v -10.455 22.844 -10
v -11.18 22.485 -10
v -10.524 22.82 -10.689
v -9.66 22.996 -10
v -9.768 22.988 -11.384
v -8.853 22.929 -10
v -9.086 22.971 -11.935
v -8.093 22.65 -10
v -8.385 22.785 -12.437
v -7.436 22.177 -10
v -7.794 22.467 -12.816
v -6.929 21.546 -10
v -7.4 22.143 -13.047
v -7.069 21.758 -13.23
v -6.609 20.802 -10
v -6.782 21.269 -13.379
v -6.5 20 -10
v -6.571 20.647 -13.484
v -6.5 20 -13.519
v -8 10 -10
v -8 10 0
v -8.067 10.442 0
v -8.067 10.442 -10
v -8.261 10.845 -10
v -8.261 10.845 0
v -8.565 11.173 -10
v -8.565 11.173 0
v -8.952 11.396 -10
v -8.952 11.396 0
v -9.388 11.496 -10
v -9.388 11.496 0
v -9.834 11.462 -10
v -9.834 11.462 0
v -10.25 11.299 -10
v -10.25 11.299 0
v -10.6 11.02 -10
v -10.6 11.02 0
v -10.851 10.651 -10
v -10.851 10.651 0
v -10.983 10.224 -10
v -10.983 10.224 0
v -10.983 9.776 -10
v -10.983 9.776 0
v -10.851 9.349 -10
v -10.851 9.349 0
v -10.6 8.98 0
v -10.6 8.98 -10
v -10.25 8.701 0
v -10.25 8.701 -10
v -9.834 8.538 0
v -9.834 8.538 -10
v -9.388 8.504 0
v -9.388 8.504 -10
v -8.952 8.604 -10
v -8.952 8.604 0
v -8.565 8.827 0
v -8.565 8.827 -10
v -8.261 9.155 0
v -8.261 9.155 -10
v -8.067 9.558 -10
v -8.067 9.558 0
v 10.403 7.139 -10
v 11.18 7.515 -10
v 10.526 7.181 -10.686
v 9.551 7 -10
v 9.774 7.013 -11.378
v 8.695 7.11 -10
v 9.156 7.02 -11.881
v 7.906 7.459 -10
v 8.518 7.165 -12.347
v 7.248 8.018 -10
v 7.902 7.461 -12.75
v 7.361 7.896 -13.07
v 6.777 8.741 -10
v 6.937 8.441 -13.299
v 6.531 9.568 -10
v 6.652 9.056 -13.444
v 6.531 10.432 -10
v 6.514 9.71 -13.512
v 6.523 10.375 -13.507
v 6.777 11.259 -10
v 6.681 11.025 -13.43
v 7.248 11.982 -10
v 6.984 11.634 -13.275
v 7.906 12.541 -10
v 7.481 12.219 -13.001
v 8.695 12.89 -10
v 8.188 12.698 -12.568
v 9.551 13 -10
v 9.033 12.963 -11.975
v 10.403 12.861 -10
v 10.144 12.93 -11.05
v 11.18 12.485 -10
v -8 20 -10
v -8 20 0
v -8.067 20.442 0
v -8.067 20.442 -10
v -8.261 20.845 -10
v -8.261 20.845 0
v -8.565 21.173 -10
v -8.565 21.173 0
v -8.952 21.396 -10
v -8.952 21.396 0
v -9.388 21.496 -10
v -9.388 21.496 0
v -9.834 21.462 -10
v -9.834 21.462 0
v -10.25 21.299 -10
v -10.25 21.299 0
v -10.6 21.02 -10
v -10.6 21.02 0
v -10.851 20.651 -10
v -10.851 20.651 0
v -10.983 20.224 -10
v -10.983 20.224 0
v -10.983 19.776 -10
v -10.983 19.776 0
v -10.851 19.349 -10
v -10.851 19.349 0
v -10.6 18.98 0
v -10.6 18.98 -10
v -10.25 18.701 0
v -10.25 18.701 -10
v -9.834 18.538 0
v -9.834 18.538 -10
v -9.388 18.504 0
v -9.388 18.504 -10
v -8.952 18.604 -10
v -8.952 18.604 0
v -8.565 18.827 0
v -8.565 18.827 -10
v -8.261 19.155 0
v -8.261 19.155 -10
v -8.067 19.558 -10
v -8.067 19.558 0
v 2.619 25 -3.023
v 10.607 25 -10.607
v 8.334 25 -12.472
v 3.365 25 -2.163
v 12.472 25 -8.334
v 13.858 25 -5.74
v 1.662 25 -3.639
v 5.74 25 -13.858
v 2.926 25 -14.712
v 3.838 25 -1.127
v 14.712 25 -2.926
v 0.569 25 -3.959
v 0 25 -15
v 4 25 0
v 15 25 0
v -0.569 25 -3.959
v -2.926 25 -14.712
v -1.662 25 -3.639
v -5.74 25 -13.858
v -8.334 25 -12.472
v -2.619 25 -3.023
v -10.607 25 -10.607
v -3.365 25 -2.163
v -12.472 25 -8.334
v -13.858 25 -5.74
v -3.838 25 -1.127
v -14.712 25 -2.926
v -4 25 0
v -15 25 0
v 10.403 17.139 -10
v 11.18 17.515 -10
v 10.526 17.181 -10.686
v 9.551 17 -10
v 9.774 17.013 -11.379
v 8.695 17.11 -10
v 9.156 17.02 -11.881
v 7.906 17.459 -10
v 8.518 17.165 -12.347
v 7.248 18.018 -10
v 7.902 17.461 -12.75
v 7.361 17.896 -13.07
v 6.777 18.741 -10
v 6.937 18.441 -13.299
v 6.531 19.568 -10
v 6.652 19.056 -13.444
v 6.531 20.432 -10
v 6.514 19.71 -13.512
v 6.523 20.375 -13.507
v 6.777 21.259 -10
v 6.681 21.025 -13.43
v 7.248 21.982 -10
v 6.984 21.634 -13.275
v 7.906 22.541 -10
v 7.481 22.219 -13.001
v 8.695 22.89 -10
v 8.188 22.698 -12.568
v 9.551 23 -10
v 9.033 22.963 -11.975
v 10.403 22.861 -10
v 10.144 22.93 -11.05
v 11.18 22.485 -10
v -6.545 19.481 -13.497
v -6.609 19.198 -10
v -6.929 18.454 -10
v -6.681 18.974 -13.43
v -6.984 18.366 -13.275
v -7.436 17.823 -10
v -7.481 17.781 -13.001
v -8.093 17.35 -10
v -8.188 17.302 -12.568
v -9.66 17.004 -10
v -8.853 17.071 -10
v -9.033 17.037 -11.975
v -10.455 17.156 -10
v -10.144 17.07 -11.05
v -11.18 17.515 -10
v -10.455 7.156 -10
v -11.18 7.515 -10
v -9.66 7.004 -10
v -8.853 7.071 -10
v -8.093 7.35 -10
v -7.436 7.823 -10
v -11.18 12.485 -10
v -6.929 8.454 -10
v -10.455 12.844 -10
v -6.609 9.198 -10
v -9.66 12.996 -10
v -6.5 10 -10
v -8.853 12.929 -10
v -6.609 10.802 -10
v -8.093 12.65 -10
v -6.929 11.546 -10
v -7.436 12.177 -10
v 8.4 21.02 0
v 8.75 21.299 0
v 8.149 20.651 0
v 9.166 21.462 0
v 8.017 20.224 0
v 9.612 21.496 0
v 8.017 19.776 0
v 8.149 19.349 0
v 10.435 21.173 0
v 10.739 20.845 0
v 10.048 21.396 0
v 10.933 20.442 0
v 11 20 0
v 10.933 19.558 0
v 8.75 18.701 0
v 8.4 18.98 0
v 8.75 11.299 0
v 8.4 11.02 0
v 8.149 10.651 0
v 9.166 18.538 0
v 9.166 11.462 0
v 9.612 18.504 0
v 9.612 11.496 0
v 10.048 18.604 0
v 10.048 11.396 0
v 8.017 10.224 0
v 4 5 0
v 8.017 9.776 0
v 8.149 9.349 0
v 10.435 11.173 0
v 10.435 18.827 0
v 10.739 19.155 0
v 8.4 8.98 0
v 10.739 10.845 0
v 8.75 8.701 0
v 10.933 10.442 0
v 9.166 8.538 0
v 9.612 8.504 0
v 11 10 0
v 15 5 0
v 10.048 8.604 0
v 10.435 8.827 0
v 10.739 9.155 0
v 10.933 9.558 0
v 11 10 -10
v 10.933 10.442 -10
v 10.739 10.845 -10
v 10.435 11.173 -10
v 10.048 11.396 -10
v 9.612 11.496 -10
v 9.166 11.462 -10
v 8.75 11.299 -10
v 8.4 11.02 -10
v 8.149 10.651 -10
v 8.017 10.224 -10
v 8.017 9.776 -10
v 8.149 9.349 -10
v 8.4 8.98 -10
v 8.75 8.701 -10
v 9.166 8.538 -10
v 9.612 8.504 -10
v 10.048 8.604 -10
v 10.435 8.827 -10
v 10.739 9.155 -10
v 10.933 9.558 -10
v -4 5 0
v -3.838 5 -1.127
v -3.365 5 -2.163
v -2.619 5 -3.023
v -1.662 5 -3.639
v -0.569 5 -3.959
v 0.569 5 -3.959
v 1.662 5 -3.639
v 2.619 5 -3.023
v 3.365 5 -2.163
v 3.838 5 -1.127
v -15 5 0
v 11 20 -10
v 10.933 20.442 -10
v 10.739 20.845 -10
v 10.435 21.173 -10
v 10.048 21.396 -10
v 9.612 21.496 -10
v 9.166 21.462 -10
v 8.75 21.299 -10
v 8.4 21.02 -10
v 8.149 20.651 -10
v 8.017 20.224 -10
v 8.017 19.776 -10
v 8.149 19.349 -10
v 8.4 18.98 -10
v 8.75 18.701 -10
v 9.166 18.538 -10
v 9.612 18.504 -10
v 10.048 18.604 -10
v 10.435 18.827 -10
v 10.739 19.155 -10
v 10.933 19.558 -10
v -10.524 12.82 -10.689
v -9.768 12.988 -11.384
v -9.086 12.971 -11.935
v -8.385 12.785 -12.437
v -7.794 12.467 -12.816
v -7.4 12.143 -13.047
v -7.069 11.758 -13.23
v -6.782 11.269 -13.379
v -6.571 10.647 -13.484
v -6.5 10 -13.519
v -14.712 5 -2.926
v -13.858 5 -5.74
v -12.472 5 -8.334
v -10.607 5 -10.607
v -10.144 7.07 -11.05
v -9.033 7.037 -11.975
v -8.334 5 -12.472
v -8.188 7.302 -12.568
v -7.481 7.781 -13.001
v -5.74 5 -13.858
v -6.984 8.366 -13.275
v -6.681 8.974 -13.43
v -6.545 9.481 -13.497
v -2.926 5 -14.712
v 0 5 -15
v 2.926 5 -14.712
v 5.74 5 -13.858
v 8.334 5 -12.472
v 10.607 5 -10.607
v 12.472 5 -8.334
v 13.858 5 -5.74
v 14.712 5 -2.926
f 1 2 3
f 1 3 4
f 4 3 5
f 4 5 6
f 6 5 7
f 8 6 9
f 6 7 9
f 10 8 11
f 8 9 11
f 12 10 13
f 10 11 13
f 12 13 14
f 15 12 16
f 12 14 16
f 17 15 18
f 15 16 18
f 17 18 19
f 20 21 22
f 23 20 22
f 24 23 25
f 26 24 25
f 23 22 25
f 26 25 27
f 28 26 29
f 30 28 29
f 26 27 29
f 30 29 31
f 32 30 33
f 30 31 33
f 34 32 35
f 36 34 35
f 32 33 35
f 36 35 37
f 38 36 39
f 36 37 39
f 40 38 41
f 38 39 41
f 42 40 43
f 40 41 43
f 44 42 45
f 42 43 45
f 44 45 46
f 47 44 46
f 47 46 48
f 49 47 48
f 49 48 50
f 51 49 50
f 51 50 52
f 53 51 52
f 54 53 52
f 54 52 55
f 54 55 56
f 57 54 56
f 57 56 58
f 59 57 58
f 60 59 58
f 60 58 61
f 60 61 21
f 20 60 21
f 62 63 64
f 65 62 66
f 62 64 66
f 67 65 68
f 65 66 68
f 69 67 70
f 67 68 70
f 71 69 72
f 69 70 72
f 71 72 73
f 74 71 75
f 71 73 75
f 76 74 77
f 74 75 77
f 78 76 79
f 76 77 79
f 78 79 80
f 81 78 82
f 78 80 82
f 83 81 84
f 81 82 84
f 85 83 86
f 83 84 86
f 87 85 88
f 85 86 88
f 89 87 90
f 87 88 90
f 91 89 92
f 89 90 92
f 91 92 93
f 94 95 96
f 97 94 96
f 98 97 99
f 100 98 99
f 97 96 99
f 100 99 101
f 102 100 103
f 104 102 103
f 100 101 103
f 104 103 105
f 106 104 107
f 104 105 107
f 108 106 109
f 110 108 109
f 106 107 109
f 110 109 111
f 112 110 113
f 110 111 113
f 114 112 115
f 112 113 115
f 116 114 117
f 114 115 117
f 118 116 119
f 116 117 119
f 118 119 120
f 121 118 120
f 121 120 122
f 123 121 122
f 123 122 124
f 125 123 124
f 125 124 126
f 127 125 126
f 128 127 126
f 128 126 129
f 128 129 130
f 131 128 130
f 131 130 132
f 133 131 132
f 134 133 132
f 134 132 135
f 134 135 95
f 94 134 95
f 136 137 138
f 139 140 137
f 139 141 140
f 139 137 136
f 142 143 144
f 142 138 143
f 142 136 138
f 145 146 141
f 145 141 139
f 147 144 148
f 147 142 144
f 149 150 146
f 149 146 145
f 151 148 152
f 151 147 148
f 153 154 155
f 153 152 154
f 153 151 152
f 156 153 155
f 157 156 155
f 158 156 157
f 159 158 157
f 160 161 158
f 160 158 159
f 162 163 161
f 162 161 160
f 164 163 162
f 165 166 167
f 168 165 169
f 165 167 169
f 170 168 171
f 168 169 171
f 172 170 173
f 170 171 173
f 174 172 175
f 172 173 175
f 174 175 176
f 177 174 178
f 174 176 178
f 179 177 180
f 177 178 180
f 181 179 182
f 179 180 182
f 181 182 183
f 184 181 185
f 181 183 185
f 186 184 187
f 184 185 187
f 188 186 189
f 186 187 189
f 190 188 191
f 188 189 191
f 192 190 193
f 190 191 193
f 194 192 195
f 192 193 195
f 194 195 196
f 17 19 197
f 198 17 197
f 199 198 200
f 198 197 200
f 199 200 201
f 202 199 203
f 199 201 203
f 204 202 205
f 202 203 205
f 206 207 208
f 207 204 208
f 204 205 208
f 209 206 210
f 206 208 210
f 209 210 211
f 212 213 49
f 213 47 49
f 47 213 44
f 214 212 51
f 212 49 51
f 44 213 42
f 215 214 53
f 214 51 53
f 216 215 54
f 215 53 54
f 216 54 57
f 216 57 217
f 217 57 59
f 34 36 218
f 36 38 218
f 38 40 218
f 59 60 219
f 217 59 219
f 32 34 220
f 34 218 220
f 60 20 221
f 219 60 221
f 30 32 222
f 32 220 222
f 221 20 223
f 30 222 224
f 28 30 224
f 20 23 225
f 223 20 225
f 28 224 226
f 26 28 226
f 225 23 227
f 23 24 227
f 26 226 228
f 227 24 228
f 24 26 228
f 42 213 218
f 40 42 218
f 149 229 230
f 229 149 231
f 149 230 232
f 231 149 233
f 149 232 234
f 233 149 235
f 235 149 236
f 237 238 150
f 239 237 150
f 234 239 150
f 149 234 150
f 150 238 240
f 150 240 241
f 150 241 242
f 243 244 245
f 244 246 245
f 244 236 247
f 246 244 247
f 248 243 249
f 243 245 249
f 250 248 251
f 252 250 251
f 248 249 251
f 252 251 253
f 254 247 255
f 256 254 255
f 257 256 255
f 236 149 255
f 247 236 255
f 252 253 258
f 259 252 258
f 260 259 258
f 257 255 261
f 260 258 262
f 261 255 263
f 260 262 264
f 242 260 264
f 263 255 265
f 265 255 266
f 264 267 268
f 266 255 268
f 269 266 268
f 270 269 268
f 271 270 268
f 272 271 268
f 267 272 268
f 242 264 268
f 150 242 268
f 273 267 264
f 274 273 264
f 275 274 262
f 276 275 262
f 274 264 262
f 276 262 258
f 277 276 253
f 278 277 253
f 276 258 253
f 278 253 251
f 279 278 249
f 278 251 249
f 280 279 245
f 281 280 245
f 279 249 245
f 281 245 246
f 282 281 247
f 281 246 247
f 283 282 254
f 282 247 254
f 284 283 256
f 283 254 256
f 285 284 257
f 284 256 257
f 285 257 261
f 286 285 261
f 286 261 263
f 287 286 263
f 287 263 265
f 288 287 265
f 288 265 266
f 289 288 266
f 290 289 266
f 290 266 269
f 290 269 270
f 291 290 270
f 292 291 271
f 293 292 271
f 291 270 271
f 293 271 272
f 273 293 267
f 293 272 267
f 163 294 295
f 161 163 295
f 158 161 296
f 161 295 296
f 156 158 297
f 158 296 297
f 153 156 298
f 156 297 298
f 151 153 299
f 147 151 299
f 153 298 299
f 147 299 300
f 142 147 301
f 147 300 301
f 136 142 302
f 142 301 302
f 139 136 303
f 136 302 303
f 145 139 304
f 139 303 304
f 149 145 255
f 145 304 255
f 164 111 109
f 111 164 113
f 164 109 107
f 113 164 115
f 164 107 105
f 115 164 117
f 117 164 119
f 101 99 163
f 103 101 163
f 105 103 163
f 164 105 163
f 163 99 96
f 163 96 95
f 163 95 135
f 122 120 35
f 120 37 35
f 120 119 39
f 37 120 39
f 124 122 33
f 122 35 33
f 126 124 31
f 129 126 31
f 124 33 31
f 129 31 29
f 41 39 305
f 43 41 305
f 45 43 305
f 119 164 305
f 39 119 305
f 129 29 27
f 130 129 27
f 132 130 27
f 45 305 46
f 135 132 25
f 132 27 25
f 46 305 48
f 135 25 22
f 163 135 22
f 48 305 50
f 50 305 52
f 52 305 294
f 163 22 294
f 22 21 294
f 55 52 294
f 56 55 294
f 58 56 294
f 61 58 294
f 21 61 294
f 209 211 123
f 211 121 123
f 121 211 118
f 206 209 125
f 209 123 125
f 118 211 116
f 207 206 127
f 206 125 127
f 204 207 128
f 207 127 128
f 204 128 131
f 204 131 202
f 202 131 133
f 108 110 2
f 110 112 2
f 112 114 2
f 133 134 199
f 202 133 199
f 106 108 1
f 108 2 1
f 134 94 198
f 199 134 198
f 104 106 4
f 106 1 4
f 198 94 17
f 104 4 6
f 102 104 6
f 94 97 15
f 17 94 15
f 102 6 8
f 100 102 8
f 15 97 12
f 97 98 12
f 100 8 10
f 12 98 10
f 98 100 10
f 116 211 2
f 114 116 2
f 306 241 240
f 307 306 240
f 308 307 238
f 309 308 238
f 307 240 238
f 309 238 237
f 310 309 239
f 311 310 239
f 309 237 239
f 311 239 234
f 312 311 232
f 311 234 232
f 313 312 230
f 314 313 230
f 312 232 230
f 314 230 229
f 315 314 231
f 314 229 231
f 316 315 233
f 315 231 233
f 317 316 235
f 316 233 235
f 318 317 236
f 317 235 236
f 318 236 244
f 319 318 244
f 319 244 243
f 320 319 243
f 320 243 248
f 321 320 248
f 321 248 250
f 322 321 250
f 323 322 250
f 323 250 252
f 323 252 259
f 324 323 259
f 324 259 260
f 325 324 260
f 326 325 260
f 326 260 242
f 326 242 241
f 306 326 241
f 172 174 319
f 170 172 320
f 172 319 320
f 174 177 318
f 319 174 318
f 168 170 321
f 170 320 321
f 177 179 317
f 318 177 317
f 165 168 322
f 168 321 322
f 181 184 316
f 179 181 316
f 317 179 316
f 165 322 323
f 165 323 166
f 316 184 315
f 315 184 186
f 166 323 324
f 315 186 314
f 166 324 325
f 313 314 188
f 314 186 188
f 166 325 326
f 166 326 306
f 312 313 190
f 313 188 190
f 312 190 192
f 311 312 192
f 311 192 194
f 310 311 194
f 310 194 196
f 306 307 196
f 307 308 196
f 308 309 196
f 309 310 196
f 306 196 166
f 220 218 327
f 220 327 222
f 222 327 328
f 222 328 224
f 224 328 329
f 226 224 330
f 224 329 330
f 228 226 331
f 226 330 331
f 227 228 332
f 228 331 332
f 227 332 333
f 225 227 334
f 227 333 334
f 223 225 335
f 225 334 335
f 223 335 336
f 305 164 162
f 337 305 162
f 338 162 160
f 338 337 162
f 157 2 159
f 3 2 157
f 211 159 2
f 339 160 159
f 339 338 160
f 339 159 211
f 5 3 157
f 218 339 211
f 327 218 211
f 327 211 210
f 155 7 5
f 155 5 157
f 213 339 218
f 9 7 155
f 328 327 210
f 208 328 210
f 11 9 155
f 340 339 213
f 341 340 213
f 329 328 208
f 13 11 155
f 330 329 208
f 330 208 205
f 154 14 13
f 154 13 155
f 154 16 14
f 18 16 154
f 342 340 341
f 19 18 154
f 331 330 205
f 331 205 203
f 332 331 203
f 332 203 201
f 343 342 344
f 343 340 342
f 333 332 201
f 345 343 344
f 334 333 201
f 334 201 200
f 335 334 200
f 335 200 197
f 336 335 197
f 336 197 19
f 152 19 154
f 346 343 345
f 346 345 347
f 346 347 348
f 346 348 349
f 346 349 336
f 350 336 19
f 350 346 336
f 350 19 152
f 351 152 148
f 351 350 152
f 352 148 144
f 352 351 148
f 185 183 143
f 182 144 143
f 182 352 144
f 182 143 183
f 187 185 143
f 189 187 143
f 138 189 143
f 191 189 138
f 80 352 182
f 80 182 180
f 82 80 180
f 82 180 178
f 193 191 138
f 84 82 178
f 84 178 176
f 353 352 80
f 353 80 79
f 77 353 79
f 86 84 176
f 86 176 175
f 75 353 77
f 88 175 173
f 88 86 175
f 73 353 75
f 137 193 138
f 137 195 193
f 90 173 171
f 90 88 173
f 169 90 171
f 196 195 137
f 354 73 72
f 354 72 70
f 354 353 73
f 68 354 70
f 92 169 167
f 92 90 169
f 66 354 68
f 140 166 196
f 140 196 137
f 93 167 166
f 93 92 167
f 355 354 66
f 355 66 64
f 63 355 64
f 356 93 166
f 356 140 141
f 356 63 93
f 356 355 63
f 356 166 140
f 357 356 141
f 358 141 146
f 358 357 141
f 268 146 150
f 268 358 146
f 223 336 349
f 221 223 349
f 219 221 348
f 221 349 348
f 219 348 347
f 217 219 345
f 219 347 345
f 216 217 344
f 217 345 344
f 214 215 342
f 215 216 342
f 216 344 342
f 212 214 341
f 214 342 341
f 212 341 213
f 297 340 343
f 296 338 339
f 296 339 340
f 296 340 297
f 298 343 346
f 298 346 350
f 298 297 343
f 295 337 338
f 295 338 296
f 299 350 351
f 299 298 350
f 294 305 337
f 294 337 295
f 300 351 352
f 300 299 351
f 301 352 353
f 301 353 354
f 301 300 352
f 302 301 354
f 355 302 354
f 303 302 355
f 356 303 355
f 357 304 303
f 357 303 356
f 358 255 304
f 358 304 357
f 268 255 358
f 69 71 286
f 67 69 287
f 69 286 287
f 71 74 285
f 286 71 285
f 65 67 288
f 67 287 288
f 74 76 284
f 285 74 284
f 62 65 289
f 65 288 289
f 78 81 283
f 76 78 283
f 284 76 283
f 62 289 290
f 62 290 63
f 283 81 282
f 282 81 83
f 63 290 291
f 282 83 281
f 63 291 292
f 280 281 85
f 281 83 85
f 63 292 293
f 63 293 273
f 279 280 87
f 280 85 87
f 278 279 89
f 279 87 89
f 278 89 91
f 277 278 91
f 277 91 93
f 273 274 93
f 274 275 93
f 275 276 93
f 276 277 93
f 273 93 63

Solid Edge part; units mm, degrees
sketch "Sketch1" plane through (0, 0, 0) normal (0, -1, 0) x (1, 0, 0)
  line L0 (4, 0) -> (15, 0)
  line L1 (-15, 0) -> (-4, 0)
  arc A0 (-4, 0) -> (4, 0) centre (0, 0) ccw
  arc A1 (15, 0) -> (-15, 0) centre (0, 0) cw
extrude "Protrusion1" add sketch "Sketch1" against normal blind 30
sketch "Sketch2" plane through (9.5, 15, 0) normal (0, 0, 1) x (0, 1, 0)
  line L0 (-10, -5.5) -> (10, -5.5)
  line L1 (10, -5.5) -> (10, 24.5)
  line L2 (10, 24.5) -> (-10, 24.5)
  line L3 (-10, 24.5) -> (-10, -5.5)
  line L4 (20, -7.2229) -> (-20, -7.2229)
  line L5 (-20, -7.2229) -> (-20, 26.2229)
  line L6 (-20, 26.2229) -> (20, 26.2229)
  line L7 (20, 26.2229) -> (20, -7.2229)
extrude "ExtrudedCutout_3" cut sketch "Sketch2" against normal blind 40
sketch "Sketch3" plane through (-9.5, 15, 0) normal (0, 0, 1) x (1, 0, 0)
  circle A0 centre (0, 5) radius 1.5
  circle A1 centre (0, -5) radius 1.5
  circle A2 centre (19, -5) radius 1.5
  circle A3 centre (19, 5) radius 1.5
extrude "ExtrudedCutout_4" cut sketch "Sketch3" against normal blind 20
sketch "Sketch4" plane through (9.5, 15, -20) normal (0, 0, 1) x (1, 0, 0)
  circle A0 centre (0, 5) radius 3
  circle A1 centre (0, -5) radius 3
  circle A2 centre (-19, -5) radius 3
  circle A3 centre (-19, 5) radius 3
extrude "ExtrudedCutout_5" cut sketch "Sketch4" along normal blind 10
